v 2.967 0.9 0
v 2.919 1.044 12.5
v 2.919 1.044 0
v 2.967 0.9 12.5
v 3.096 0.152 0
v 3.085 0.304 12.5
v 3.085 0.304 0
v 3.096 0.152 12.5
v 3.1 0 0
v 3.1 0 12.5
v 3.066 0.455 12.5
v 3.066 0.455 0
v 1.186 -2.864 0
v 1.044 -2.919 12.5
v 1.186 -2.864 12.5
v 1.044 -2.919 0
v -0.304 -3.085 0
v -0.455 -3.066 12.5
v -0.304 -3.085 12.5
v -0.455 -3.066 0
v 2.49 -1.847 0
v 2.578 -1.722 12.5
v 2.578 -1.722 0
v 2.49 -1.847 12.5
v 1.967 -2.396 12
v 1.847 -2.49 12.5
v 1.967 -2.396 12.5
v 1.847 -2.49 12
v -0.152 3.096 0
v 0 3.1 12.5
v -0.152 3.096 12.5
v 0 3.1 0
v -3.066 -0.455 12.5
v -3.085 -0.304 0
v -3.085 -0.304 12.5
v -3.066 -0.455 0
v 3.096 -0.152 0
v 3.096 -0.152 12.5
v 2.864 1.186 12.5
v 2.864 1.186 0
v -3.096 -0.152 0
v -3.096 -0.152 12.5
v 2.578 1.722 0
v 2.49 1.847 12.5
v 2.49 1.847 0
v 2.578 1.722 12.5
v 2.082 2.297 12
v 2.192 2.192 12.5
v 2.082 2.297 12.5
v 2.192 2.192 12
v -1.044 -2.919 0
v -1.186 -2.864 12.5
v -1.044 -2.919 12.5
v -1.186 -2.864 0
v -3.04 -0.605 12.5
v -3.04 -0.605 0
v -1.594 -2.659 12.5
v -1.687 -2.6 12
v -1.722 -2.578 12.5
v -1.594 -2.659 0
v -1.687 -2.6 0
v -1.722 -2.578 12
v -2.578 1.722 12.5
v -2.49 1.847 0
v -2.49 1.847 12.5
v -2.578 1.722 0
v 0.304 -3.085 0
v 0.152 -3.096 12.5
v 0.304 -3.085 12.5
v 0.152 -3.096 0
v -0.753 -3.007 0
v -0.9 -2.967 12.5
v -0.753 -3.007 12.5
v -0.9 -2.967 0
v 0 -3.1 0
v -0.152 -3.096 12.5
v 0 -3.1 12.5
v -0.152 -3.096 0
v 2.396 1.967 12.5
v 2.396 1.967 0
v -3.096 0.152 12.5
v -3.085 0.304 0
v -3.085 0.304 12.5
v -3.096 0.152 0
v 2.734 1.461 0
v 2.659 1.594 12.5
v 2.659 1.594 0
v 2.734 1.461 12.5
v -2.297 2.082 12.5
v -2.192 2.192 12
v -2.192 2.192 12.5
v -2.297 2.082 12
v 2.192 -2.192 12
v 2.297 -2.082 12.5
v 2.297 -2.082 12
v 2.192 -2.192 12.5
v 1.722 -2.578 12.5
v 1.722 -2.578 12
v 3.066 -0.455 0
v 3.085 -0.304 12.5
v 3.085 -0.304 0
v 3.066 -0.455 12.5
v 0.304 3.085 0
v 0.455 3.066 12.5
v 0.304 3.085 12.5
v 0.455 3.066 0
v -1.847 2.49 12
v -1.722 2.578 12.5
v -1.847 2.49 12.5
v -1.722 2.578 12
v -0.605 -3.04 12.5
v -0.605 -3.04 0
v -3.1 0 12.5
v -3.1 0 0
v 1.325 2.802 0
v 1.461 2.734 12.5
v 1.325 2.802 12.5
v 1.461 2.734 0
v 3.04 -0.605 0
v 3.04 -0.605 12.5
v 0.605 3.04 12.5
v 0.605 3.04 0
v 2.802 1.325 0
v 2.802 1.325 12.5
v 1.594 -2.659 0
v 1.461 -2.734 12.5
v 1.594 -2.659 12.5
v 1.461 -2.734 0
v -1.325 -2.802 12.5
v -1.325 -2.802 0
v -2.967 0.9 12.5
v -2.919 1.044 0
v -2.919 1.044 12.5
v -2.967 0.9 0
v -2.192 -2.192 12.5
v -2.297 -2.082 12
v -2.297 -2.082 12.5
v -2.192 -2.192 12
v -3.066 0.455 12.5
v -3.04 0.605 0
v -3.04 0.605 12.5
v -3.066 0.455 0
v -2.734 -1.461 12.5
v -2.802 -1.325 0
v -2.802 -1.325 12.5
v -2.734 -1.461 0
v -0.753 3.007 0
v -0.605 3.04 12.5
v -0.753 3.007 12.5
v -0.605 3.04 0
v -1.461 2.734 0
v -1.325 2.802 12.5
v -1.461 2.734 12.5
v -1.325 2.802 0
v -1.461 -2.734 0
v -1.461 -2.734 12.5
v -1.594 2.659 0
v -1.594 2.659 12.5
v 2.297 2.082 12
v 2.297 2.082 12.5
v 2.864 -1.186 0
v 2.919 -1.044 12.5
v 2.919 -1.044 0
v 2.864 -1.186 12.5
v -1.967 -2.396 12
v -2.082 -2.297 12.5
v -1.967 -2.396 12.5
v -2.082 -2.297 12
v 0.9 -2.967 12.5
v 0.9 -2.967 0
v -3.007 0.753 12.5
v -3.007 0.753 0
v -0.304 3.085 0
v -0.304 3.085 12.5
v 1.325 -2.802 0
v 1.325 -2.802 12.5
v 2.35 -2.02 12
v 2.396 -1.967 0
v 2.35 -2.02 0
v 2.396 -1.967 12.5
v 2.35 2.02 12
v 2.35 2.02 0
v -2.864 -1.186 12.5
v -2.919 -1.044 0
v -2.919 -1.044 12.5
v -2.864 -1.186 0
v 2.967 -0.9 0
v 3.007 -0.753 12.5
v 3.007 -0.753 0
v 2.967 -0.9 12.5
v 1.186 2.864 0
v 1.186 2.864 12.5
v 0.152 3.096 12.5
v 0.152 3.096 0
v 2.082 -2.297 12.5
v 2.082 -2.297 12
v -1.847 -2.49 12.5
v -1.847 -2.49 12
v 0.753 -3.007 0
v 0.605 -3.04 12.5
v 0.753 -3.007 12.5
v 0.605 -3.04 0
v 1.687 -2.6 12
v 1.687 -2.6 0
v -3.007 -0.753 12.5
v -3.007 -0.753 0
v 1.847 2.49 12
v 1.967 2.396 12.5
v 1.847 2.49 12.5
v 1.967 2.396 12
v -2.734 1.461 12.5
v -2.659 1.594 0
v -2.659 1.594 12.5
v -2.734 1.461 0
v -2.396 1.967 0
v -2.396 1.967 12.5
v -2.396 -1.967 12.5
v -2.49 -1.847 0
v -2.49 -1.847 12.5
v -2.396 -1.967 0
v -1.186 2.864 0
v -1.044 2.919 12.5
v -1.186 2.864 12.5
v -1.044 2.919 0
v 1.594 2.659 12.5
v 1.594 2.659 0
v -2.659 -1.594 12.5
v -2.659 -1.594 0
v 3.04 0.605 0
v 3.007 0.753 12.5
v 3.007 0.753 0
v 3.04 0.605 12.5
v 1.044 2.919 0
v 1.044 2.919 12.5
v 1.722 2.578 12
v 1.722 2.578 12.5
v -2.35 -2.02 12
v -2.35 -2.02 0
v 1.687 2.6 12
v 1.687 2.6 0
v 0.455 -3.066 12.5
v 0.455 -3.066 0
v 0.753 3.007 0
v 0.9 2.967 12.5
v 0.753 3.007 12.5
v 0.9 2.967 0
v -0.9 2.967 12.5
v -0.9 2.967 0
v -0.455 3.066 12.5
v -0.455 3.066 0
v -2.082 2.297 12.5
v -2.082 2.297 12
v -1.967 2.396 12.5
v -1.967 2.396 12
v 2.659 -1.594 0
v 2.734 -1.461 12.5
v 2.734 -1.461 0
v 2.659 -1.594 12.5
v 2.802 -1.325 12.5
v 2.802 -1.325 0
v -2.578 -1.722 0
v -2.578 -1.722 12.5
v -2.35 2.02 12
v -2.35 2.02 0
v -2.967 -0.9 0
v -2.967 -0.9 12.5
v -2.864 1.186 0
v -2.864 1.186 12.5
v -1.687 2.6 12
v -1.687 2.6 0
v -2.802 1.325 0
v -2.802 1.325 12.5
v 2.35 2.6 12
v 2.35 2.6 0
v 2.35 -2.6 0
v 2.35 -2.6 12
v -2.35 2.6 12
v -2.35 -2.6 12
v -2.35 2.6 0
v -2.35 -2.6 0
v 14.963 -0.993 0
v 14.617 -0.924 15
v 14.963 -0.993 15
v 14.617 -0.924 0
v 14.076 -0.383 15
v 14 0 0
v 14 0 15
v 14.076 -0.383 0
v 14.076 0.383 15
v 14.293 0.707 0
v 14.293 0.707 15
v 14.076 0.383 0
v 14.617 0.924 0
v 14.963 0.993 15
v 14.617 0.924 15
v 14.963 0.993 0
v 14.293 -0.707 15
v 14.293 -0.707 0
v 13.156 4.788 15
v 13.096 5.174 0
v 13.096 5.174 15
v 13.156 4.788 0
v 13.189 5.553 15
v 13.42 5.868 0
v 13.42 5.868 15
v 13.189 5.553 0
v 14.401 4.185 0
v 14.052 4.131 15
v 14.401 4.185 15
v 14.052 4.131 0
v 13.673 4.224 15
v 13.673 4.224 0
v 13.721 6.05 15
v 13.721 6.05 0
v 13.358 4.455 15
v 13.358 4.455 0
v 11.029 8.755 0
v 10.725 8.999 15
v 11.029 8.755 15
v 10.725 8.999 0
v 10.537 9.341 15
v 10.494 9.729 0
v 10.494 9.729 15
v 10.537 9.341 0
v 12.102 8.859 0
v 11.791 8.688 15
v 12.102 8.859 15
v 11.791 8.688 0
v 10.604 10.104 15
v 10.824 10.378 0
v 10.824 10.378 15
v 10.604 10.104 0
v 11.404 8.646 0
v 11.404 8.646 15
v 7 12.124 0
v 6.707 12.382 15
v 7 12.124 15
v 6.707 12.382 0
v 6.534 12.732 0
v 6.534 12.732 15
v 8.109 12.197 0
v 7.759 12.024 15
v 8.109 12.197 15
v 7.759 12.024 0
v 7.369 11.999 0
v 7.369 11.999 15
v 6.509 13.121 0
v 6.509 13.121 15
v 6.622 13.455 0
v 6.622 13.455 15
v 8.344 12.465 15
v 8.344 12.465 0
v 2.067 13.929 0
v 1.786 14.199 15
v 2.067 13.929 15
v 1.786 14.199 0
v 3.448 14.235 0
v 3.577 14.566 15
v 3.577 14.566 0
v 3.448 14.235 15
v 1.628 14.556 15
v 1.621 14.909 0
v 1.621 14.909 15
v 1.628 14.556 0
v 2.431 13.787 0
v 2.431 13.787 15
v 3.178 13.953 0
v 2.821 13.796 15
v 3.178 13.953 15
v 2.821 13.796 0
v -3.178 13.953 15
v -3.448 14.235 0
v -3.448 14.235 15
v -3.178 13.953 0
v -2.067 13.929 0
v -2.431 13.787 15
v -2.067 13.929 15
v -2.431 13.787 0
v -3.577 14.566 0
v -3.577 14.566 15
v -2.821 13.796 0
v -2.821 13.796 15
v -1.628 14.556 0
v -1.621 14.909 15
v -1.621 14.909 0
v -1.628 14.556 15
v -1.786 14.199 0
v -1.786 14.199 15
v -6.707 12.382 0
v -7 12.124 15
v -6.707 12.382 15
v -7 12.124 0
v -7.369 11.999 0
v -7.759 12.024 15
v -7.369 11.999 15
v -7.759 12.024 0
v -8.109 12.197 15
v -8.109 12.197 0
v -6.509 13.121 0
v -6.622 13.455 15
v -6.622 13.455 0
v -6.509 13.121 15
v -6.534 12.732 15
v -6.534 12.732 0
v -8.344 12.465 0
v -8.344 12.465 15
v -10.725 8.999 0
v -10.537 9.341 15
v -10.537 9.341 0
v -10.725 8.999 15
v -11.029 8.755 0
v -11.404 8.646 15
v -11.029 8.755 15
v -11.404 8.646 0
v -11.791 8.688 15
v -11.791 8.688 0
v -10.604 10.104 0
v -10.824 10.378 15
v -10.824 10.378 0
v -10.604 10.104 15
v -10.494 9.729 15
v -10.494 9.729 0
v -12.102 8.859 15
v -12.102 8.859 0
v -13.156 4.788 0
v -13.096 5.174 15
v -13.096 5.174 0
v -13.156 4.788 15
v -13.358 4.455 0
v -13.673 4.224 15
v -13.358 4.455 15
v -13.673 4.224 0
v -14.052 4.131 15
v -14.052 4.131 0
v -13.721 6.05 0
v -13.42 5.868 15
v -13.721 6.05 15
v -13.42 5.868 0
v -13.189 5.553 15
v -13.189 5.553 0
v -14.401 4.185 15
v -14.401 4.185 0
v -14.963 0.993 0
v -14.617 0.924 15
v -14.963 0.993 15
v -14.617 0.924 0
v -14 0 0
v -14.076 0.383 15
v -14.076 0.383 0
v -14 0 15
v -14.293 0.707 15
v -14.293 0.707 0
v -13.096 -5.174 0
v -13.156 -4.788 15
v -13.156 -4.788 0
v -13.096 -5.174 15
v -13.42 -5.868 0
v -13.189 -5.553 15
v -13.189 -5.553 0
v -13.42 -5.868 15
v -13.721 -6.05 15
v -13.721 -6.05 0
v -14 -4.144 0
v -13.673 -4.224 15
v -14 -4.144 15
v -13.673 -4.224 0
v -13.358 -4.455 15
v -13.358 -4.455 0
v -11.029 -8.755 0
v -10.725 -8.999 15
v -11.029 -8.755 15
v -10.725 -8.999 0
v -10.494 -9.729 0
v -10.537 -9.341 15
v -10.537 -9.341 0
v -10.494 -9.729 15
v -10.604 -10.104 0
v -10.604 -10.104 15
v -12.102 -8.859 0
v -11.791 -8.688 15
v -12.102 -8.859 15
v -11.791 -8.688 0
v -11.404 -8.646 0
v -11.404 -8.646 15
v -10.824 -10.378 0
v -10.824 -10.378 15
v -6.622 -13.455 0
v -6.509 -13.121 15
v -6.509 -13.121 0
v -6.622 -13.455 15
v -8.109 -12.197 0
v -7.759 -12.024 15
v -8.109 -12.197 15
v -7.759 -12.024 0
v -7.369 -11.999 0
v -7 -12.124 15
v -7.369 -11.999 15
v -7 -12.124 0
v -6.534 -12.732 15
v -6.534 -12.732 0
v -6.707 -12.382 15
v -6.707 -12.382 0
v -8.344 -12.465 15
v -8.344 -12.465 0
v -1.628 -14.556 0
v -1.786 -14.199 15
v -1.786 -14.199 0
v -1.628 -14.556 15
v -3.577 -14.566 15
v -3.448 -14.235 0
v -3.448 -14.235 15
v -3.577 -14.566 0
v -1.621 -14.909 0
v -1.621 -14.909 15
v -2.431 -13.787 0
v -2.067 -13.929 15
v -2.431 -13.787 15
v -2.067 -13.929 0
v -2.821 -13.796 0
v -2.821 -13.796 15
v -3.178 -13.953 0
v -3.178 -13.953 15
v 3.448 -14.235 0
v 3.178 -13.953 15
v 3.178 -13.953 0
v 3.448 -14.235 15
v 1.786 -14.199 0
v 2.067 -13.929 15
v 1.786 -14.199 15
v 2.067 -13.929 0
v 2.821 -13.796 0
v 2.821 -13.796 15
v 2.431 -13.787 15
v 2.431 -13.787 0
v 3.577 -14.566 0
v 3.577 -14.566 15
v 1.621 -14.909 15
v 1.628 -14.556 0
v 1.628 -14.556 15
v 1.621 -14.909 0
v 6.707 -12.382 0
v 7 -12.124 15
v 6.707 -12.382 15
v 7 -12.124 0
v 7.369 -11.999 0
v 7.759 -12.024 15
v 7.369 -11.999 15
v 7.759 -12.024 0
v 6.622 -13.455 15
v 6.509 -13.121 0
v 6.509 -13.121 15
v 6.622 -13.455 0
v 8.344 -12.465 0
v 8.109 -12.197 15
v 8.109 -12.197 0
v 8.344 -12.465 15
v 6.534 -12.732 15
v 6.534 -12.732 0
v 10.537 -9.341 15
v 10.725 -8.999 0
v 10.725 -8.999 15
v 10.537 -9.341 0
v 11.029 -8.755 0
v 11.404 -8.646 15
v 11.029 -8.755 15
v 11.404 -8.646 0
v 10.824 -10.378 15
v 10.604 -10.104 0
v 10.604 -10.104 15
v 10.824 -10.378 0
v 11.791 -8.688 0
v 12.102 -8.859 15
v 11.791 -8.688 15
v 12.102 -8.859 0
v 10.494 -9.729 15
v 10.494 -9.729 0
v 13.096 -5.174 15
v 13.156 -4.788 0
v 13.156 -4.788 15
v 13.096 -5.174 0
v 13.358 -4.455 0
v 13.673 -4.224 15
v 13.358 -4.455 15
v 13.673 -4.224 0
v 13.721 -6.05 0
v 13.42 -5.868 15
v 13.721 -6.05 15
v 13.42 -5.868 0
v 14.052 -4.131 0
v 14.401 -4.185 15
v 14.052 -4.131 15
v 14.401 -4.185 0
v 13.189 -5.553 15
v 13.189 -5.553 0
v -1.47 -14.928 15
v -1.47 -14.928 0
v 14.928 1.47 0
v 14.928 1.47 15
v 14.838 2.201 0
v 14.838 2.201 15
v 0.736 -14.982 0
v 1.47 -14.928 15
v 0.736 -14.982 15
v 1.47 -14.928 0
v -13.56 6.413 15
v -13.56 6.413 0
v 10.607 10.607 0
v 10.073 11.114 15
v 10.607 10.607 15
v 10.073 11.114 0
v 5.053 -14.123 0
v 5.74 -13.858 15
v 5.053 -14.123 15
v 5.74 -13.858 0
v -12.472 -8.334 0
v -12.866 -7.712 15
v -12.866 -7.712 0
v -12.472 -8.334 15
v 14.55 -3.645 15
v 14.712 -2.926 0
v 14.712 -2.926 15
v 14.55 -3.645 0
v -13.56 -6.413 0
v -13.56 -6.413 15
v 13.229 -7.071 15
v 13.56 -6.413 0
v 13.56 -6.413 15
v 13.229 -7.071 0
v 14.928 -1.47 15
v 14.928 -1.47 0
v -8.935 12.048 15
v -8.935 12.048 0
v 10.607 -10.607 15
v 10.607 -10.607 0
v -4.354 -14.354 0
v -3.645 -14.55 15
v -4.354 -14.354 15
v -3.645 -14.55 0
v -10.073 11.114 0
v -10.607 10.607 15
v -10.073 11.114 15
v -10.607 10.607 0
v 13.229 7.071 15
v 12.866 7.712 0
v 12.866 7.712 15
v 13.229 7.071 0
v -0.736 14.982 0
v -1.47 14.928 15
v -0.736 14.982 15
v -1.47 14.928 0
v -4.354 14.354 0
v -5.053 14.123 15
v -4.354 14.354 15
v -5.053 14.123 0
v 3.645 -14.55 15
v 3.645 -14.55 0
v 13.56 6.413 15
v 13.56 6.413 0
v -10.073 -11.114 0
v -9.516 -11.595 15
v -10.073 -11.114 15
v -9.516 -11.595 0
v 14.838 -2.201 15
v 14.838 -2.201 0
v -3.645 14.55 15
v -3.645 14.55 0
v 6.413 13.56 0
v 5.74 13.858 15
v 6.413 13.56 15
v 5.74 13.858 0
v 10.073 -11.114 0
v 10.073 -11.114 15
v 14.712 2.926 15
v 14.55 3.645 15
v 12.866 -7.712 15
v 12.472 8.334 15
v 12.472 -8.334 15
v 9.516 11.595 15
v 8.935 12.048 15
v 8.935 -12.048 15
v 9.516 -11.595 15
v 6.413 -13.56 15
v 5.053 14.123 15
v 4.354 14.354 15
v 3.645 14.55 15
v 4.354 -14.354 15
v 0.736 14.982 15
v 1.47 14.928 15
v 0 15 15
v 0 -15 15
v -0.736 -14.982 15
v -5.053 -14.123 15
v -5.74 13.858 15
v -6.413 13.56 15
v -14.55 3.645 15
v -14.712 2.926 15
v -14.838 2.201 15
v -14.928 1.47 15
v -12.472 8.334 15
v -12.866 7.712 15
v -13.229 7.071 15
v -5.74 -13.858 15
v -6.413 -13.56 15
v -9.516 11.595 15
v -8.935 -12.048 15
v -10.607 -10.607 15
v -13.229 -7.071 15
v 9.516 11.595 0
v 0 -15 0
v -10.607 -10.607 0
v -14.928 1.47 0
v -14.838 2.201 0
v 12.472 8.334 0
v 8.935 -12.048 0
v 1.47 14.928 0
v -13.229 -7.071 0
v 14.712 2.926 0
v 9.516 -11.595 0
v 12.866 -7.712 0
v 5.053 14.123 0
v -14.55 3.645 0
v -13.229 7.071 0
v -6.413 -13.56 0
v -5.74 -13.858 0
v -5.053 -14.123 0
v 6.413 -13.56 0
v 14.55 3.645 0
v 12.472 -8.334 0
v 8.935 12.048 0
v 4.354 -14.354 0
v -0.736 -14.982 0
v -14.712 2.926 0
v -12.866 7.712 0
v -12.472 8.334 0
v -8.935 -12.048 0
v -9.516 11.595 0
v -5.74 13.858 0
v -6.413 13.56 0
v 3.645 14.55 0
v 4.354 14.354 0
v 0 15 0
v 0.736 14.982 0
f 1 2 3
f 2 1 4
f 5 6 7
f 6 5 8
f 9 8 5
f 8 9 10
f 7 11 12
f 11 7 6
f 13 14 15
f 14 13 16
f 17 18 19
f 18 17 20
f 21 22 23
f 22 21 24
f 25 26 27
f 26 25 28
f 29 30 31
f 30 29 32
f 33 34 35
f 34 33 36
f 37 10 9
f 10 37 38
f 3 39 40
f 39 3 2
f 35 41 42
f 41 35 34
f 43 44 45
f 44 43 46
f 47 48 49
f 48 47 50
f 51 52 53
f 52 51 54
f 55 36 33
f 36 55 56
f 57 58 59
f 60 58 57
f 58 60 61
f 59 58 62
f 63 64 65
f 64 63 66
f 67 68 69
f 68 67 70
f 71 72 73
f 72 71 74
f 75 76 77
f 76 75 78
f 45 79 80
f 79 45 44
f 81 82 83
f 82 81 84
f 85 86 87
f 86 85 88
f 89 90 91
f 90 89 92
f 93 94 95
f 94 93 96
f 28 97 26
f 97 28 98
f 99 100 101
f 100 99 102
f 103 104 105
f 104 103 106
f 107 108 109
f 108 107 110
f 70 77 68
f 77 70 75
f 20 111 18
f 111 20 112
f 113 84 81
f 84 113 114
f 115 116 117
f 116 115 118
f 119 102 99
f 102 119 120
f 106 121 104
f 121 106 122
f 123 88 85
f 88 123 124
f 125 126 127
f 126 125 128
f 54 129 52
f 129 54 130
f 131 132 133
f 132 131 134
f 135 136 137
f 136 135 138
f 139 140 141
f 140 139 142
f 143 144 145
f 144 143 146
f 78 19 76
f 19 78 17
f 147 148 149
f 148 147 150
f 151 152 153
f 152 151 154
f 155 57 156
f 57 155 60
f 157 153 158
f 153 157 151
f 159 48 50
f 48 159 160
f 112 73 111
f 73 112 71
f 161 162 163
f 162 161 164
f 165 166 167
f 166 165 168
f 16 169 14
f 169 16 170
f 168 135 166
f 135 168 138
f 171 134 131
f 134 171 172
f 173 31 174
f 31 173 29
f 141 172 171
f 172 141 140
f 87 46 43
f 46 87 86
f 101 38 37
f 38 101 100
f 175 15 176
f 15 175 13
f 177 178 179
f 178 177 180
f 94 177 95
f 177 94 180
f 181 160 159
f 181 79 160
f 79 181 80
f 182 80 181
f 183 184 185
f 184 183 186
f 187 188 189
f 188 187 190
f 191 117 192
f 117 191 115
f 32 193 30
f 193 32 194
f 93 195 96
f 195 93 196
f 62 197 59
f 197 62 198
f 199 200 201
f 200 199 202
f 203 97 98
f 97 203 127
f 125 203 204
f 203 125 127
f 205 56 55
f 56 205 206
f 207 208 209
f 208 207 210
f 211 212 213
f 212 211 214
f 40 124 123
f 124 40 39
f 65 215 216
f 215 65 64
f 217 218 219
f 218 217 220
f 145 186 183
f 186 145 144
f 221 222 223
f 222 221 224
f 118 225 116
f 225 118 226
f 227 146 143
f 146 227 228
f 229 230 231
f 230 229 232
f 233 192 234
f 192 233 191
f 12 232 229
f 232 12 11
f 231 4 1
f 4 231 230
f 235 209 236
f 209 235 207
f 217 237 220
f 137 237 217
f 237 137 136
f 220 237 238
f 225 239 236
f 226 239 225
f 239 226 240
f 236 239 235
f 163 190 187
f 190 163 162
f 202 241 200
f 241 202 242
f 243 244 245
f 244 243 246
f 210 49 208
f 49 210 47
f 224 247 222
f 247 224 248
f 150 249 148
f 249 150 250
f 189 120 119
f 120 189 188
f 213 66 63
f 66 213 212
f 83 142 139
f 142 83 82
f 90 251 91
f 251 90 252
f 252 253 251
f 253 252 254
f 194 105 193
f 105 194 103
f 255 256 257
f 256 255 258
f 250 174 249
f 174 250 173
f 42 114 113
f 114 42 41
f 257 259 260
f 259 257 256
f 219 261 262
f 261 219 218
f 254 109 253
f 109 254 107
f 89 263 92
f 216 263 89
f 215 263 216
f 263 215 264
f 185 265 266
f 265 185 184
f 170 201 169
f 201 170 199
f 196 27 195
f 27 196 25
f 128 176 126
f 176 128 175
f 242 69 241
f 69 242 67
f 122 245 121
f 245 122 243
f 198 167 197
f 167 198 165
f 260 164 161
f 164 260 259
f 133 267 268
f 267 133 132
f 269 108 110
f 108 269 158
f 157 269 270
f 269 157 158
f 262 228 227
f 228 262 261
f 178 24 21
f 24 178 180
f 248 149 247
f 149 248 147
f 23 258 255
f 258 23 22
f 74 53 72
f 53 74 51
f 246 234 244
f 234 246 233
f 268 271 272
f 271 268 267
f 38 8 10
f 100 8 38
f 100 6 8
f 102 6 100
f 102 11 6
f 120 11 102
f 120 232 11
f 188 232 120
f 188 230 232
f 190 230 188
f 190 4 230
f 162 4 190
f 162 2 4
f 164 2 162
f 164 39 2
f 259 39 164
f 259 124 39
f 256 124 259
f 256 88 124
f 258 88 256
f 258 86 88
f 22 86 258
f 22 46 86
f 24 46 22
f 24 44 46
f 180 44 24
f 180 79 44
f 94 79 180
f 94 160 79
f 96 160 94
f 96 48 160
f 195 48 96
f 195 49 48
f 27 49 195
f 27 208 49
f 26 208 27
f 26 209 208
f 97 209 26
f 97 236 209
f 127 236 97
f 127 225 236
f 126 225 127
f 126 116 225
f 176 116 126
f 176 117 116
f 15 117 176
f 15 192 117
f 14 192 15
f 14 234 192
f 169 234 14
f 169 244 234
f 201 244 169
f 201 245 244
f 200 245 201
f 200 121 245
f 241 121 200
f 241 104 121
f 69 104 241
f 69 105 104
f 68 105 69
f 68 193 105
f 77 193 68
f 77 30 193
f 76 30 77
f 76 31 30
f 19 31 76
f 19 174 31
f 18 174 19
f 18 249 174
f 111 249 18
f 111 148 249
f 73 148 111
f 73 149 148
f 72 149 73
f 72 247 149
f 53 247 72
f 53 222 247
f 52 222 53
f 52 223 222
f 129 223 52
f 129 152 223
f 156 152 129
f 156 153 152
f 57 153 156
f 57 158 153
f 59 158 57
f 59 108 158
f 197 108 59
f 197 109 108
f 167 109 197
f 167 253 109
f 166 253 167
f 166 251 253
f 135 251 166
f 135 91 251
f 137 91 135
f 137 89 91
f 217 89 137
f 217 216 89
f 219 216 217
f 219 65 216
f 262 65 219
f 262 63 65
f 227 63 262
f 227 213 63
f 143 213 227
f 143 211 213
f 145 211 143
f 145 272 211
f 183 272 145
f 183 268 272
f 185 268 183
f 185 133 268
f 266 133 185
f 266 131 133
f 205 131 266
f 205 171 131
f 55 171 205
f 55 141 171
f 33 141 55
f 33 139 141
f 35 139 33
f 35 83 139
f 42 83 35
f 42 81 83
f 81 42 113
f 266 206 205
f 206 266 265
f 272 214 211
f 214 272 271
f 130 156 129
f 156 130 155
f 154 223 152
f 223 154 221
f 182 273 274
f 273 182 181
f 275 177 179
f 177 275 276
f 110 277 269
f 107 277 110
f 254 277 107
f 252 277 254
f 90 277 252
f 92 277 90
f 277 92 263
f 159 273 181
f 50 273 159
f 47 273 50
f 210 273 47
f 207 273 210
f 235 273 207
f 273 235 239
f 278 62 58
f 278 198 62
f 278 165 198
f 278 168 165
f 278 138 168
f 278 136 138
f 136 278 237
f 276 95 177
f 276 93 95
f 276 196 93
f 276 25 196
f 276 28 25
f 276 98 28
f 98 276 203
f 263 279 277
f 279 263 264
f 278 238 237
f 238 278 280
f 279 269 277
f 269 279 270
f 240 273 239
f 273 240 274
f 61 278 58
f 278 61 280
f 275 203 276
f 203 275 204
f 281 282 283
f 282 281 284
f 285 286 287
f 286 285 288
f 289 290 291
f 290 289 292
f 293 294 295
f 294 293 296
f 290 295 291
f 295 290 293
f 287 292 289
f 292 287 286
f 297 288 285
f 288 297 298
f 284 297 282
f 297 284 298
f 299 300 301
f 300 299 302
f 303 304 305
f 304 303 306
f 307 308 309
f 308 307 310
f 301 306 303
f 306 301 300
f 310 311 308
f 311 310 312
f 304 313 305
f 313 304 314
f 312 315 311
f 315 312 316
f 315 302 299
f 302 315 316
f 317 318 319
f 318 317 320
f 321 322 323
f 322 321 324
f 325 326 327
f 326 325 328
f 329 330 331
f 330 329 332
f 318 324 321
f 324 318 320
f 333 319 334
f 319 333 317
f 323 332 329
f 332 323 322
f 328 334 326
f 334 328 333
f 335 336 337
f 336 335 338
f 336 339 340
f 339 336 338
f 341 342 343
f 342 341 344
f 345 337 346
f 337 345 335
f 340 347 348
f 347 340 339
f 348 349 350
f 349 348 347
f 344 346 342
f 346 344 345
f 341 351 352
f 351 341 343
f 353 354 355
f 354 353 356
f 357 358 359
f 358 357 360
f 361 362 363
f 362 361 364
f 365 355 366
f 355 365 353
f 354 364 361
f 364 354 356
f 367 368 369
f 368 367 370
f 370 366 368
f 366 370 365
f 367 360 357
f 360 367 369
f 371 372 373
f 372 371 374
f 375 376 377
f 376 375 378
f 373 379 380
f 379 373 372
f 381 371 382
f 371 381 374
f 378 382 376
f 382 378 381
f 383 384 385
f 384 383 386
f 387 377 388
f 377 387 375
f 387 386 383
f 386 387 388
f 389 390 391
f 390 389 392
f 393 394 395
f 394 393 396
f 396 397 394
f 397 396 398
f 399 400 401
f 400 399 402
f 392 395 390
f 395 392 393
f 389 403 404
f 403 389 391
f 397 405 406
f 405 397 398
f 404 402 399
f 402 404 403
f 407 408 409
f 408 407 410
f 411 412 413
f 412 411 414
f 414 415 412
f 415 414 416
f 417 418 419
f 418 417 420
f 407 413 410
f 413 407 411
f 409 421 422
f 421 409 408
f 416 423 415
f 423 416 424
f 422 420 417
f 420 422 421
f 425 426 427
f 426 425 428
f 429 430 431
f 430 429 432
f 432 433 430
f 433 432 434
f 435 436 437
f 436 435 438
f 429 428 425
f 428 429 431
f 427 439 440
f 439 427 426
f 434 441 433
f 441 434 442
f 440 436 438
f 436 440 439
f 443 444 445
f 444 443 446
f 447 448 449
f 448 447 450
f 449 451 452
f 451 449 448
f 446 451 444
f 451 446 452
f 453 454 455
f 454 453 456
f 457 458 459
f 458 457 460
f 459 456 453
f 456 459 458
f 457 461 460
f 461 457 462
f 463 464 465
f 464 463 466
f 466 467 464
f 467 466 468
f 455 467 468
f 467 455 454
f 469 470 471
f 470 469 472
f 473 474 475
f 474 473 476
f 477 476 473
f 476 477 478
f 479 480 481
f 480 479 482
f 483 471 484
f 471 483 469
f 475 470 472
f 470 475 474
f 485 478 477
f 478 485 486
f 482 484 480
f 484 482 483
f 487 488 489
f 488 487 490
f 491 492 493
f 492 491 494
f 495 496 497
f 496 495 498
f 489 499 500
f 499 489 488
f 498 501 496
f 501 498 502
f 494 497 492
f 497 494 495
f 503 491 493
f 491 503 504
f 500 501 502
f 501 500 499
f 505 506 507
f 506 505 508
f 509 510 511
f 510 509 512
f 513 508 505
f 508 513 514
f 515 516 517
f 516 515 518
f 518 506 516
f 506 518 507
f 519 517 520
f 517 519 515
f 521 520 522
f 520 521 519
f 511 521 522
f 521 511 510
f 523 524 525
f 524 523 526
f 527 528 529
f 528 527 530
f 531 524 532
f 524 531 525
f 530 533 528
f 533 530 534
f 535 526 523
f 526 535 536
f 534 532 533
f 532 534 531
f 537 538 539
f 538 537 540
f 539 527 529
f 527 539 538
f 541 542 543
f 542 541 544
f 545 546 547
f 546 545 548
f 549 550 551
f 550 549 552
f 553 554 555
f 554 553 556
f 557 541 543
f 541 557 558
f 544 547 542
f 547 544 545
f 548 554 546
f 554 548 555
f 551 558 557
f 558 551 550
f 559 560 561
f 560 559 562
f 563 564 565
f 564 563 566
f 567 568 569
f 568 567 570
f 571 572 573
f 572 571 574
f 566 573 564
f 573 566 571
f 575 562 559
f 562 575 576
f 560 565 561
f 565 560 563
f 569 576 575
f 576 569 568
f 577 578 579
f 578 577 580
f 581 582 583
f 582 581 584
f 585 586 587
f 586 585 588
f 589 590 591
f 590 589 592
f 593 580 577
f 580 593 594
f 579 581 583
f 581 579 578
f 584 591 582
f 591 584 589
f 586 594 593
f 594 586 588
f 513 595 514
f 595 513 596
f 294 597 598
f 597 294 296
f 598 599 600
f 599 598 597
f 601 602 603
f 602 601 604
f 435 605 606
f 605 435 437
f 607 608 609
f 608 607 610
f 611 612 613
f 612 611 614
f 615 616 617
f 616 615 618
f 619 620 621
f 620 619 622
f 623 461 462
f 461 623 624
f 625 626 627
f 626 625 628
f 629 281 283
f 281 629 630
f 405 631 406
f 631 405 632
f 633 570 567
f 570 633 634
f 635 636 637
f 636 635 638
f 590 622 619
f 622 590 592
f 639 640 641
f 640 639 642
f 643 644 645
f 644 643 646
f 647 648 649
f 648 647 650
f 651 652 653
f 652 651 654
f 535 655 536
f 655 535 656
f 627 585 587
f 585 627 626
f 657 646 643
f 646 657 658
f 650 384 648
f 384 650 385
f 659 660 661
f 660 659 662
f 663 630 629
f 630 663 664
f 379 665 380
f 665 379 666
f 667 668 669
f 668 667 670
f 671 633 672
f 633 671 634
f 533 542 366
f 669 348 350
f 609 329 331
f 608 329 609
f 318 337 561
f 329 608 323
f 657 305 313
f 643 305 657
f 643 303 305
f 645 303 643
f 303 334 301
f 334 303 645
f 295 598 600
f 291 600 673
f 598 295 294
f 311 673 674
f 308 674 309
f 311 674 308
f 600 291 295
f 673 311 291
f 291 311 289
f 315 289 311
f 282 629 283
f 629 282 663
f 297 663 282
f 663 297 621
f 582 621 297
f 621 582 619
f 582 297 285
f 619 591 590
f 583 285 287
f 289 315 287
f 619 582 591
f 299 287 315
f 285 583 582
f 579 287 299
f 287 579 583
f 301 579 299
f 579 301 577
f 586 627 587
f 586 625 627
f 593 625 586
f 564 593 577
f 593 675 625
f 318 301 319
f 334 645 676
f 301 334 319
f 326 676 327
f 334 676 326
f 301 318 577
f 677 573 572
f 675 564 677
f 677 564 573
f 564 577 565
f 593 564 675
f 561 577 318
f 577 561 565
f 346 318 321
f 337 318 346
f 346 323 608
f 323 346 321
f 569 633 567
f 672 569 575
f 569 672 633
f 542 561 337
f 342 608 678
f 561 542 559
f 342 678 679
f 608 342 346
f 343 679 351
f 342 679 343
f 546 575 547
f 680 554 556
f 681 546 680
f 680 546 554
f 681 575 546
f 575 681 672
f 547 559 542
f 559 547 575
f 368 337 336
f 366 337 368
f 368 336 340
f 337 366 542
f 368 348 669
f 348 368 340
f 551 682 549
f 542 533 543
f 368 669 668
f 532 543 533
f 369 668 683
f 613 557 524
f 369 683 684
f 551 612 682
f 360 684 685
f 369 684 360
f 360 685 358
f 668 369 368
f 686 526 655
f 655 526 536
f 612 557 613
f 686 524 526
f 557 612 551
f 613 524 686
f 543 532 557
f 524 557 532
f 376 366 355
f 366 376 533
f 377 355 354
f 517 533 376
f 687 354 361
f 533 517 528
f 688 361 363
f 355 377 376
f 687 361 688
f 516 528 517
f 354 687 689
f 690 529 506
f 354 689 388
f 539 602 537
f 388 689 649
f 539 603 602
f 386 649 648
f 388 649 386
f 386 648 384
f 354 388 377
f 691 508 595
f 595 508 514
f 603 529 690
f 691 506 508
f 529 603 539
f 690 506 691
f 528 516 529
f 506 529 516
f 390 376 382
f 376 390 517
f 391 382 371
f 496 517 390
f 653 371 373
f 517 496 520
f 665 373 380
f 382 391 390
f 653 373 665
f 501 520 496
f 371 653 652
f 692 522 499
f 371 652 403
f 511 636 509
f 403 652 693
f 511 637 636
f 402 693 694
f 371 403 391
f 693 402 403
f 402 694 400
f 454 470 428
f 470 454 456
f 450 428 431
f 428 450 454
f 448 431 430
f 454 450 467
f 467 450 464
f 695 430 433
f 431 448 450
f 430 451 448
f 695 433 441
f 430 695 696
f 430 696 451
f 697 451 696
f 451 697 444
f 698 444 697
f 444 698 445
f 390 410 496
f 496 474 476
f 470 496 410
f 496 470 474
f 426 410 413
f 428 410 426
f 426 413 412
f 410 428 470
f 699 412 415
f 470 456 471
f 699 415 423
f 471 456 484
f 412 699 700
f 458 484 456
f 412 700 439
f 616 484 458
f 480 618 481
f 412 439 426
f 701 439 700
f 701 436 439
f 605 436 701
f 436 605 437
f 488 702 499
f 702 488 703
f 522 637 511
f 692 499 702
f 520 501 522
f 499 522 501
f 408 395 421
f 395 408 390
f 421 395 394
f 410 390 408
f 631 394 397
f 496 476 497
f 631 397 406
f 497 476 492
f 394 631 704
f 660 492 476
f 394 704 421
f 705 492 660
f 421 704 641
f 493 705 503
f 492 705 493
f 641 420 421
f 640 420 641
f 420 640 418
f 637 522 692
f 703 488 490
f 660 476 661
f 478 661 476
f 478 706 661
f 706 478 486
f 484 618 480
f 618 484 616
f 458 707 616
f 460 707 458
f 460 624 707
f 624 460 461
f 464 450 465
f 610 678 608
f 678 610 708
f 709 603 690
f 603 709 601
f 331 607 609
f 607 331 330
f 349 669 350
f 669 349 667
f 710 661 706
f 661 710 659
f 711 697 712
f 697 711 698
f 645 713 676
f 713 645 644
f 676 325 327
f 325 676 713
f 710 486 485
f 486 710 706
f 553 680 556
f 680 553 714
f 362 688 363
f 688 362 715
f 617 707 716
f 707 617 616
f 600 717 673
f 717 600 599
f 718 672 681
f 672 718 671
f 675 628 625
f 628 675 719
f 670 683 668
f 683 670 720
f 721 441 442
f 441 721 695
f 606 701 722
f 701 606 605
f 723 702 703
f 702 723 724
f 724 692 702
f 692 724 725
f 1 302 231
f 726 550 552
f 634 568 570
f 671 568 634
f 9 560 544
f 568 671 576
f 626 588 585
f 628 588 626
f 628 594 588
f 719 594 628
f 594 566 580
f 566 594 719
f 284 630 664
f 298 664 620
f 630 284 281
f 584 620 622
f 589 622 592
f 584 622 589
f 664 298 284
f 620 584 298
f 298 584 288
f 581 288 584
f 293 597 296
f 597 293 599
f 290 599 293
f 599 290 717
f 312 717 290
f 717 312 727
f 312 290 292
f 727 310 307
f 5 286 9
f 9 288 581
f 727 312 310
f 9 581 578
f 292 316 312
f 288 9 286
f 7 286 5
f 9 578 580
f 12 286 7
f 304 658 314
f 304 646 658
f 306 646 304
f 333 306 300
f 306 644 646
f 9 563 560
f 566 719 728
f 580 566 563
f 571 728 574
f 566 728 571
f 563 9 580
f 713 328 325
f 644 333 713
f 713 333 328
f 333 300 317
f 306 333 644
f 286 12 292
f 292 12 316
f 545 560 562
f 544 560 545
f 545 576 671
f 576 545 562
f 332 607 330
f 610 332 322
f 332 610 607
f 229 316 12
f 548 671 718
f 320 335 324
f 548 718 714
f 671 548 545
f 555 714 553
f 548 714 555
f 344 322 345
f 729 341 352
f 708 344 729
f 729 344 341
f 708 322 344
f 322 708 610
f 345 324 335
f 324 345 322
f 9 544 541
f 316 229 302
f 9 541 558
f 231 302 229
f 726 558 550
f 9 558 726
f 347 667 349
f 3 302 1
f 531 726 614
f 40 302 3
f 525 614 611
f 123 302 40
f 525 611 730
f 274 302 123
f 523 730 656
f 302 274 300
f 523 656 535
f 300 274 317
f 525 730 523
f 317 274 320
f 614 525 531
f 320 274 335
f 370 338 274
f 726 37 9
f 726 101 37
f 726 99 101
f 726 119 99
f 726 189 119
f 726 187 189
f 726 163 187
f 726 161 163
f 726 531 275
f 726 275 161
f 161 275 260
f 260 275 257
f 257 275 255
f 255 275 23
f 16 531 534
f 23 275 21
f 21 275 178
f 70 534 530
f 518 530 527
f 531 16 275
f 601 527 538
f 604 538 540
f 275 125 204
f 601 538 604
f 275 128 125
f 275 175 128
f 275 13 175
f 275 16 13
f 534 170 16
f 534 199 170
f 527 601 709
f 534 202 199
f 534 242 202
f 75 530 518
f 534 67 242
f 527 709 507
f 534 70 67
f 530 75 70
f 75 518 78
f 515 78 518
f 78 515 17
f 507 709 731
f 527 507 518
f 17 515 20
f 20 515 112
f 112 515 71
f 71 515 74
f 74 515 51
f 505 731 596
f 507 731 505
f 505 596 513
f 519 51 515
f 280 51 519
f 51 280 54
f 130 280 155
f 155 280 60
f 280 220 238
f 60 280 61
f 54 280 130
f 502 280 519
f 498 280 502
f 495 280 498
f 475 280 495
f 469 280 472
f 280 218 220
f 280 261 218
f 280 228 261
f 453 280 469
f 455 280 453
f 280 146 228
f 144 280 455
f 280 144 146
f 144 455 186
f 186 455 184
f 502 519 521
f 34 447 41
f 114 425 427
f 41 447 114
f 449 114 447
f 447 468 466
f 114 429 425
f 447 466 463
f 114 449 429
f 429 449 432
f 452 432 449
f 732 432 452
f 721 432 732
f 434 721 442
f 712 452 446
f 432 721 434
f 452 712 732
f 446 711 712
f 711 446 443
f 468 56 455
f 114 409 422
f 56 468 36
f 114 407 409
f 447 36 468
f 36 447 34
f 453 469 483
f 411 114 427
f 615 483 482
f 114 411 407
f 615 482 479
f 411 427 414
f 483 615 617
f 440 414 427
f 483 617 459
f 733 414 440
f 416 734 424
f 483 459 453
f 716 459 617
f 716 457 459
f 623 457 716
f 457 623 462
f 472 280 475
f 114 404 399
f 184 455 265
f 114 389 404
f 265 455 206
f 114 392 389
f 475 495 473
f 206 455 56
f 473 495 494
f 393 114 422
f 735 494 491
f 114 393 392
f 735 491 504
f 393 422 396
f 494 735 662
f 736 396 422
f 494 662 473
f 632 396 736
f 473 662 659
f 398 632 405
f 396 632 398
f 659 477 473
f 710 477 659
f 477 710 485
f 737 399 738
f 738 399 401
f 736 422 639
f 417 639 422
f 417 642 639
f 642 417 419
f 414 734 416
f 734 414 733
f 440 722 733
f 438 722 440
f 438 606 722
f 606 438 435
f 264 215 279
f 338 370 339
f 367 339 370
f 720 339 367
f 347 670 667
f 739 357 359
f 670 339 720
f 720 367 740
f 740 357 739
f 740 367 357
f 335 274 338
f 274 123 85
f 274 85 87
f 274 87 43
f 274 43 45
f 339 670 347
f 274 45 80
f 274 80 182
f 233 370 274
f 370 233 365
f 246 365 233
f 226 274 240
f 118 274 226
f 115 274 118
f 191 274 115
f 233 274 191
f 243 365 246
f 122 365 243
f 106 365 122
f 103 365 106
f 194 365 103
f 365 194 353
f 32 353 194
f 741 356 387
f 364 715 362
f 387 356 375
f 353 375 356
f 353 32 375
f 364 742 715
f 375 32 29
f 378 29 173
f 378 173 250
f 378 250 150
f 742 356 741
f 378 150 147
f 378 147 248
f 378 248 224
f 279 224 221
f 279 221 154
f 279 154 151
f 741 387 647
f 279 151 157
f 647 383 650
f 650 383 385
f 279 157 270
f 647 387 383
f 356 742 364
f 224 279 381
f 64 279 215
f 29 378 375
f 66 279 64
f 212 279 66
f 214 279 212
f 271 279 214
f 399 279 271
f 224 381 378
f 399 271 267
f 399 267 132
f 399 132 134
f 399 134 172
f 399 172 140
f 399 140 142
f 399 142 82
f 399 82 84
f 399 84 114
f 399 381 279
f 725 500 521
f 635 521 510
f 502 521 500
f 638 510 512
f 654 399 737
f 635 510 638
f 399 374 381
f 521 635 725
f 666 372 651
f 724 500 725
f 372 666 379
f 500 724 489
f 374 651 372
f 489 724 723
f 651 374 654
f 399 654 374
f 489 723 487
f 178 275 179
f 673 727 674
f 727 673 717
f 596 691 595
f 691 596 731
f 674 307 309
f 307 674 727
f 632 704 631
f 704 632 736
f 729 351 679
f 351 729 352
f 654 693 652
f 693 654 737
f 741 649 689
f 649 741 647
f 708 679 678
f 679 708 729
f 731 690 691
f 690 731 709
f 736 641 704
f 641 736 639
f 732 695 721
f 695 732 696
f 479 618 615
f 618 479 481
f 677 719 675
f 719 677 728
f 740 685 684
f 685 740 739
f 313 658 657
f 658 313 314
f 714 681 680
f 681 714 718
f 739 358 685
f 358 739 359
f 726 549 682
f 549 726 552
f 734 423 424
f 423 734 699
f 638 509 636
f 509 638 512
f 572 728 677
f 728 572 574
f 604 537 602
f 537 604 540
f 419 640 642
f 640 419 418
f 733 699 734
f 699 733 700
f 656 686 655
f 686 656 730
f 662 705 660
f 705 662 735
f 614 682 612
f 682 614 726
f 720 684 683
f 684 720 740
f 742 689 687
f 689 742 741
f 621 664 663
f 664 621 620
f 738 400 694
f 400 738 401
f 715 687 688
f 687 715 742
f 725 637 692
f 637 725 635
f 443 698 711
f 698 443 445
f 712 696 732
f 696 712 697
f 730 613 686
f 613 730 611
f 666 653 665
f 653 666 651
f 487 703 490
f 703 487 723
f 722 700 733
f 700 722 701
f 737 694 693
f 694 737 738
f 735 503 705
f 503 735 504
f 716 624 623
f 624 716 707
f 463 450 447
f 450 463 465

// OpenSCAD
// Replacement knob for a hotplate stirrer with a 6 mm D-shaft
// Print orientation: bottom face (with bore) on the bed at z = 0

// ---------------- Parameters ----------------
knob_d        = 30;    // knob outer diameter (mm)
knob_h        = 15;    // knob height (mm)

bore_d        = 6.2;   // D-bore circle diameter (mm)
bore_depth    = 12;    // D-bore depth from bottom face (mm)
bore_flat     = 4.7;   // distance from D-bore flat to opposite side (mm)

groove_count  = 18;    // number of vertical grip grooves
groove_d      = 2;     // grip groove diameter (mm)

pointer_w     = 1.5;   // pointer groove width (mm)
pointer_d     = 1;     // pointer groove depth (mm)

eps           = 0.5;   // overcut so cutting faces are not coplanar (mm)

$fn = 128;             // circle resolution

// ---------------- Derived ----------------
function bore_r() = bore_d / 2;

// ---------------- Model ----------------
difference() {
    // Main body: cylinder, centred in X/Y, sitting on z = 0
    cylinder(d = knob_d, h = knob_h);

    // D-shaped blind bore from the bottom face
    translate([0, 0, -eps])
        union() {
            // Circle
            cylinder(r = bore_r(), h = bore_depth + 2 * eps);
            // Flat on one side: extend past the wall, keep the same y span
            translate([-bore_flat / 2, -bore_r() + eps, 0])
                cube([bore_flat, 2 * (bore_r() - eps), bore_depth + eps]);
        }

    // Vertical grip grooves along the full height
    for (i = [0 : groove_count - 1])
        rotate([0, 0, i * 360 / groove_count])
            translate([knob_d / 2, 0, -eps])
                cylinder(d = groove_d, h = knob_h + 2 * eps, $fn = 16);

    // Pointer groove on the top face, on the same side as the D-flat
    // (extruded along X, so the polygon lies in the X/Y plane)
    translate([-knob_d / 2 - eps, 0, knob_h - pointer_d])
        rotate([90, 0, 0])
            linear_extrude(height = knob_d / 2 + eps)
                polygon([
                    [0,         knob_d / 2],
                    [pointer_w, knob_d / 2],
                    [pointer_w, -knob_d / 2],
                    [0,         -knob_d / 2]
                ]);
}
